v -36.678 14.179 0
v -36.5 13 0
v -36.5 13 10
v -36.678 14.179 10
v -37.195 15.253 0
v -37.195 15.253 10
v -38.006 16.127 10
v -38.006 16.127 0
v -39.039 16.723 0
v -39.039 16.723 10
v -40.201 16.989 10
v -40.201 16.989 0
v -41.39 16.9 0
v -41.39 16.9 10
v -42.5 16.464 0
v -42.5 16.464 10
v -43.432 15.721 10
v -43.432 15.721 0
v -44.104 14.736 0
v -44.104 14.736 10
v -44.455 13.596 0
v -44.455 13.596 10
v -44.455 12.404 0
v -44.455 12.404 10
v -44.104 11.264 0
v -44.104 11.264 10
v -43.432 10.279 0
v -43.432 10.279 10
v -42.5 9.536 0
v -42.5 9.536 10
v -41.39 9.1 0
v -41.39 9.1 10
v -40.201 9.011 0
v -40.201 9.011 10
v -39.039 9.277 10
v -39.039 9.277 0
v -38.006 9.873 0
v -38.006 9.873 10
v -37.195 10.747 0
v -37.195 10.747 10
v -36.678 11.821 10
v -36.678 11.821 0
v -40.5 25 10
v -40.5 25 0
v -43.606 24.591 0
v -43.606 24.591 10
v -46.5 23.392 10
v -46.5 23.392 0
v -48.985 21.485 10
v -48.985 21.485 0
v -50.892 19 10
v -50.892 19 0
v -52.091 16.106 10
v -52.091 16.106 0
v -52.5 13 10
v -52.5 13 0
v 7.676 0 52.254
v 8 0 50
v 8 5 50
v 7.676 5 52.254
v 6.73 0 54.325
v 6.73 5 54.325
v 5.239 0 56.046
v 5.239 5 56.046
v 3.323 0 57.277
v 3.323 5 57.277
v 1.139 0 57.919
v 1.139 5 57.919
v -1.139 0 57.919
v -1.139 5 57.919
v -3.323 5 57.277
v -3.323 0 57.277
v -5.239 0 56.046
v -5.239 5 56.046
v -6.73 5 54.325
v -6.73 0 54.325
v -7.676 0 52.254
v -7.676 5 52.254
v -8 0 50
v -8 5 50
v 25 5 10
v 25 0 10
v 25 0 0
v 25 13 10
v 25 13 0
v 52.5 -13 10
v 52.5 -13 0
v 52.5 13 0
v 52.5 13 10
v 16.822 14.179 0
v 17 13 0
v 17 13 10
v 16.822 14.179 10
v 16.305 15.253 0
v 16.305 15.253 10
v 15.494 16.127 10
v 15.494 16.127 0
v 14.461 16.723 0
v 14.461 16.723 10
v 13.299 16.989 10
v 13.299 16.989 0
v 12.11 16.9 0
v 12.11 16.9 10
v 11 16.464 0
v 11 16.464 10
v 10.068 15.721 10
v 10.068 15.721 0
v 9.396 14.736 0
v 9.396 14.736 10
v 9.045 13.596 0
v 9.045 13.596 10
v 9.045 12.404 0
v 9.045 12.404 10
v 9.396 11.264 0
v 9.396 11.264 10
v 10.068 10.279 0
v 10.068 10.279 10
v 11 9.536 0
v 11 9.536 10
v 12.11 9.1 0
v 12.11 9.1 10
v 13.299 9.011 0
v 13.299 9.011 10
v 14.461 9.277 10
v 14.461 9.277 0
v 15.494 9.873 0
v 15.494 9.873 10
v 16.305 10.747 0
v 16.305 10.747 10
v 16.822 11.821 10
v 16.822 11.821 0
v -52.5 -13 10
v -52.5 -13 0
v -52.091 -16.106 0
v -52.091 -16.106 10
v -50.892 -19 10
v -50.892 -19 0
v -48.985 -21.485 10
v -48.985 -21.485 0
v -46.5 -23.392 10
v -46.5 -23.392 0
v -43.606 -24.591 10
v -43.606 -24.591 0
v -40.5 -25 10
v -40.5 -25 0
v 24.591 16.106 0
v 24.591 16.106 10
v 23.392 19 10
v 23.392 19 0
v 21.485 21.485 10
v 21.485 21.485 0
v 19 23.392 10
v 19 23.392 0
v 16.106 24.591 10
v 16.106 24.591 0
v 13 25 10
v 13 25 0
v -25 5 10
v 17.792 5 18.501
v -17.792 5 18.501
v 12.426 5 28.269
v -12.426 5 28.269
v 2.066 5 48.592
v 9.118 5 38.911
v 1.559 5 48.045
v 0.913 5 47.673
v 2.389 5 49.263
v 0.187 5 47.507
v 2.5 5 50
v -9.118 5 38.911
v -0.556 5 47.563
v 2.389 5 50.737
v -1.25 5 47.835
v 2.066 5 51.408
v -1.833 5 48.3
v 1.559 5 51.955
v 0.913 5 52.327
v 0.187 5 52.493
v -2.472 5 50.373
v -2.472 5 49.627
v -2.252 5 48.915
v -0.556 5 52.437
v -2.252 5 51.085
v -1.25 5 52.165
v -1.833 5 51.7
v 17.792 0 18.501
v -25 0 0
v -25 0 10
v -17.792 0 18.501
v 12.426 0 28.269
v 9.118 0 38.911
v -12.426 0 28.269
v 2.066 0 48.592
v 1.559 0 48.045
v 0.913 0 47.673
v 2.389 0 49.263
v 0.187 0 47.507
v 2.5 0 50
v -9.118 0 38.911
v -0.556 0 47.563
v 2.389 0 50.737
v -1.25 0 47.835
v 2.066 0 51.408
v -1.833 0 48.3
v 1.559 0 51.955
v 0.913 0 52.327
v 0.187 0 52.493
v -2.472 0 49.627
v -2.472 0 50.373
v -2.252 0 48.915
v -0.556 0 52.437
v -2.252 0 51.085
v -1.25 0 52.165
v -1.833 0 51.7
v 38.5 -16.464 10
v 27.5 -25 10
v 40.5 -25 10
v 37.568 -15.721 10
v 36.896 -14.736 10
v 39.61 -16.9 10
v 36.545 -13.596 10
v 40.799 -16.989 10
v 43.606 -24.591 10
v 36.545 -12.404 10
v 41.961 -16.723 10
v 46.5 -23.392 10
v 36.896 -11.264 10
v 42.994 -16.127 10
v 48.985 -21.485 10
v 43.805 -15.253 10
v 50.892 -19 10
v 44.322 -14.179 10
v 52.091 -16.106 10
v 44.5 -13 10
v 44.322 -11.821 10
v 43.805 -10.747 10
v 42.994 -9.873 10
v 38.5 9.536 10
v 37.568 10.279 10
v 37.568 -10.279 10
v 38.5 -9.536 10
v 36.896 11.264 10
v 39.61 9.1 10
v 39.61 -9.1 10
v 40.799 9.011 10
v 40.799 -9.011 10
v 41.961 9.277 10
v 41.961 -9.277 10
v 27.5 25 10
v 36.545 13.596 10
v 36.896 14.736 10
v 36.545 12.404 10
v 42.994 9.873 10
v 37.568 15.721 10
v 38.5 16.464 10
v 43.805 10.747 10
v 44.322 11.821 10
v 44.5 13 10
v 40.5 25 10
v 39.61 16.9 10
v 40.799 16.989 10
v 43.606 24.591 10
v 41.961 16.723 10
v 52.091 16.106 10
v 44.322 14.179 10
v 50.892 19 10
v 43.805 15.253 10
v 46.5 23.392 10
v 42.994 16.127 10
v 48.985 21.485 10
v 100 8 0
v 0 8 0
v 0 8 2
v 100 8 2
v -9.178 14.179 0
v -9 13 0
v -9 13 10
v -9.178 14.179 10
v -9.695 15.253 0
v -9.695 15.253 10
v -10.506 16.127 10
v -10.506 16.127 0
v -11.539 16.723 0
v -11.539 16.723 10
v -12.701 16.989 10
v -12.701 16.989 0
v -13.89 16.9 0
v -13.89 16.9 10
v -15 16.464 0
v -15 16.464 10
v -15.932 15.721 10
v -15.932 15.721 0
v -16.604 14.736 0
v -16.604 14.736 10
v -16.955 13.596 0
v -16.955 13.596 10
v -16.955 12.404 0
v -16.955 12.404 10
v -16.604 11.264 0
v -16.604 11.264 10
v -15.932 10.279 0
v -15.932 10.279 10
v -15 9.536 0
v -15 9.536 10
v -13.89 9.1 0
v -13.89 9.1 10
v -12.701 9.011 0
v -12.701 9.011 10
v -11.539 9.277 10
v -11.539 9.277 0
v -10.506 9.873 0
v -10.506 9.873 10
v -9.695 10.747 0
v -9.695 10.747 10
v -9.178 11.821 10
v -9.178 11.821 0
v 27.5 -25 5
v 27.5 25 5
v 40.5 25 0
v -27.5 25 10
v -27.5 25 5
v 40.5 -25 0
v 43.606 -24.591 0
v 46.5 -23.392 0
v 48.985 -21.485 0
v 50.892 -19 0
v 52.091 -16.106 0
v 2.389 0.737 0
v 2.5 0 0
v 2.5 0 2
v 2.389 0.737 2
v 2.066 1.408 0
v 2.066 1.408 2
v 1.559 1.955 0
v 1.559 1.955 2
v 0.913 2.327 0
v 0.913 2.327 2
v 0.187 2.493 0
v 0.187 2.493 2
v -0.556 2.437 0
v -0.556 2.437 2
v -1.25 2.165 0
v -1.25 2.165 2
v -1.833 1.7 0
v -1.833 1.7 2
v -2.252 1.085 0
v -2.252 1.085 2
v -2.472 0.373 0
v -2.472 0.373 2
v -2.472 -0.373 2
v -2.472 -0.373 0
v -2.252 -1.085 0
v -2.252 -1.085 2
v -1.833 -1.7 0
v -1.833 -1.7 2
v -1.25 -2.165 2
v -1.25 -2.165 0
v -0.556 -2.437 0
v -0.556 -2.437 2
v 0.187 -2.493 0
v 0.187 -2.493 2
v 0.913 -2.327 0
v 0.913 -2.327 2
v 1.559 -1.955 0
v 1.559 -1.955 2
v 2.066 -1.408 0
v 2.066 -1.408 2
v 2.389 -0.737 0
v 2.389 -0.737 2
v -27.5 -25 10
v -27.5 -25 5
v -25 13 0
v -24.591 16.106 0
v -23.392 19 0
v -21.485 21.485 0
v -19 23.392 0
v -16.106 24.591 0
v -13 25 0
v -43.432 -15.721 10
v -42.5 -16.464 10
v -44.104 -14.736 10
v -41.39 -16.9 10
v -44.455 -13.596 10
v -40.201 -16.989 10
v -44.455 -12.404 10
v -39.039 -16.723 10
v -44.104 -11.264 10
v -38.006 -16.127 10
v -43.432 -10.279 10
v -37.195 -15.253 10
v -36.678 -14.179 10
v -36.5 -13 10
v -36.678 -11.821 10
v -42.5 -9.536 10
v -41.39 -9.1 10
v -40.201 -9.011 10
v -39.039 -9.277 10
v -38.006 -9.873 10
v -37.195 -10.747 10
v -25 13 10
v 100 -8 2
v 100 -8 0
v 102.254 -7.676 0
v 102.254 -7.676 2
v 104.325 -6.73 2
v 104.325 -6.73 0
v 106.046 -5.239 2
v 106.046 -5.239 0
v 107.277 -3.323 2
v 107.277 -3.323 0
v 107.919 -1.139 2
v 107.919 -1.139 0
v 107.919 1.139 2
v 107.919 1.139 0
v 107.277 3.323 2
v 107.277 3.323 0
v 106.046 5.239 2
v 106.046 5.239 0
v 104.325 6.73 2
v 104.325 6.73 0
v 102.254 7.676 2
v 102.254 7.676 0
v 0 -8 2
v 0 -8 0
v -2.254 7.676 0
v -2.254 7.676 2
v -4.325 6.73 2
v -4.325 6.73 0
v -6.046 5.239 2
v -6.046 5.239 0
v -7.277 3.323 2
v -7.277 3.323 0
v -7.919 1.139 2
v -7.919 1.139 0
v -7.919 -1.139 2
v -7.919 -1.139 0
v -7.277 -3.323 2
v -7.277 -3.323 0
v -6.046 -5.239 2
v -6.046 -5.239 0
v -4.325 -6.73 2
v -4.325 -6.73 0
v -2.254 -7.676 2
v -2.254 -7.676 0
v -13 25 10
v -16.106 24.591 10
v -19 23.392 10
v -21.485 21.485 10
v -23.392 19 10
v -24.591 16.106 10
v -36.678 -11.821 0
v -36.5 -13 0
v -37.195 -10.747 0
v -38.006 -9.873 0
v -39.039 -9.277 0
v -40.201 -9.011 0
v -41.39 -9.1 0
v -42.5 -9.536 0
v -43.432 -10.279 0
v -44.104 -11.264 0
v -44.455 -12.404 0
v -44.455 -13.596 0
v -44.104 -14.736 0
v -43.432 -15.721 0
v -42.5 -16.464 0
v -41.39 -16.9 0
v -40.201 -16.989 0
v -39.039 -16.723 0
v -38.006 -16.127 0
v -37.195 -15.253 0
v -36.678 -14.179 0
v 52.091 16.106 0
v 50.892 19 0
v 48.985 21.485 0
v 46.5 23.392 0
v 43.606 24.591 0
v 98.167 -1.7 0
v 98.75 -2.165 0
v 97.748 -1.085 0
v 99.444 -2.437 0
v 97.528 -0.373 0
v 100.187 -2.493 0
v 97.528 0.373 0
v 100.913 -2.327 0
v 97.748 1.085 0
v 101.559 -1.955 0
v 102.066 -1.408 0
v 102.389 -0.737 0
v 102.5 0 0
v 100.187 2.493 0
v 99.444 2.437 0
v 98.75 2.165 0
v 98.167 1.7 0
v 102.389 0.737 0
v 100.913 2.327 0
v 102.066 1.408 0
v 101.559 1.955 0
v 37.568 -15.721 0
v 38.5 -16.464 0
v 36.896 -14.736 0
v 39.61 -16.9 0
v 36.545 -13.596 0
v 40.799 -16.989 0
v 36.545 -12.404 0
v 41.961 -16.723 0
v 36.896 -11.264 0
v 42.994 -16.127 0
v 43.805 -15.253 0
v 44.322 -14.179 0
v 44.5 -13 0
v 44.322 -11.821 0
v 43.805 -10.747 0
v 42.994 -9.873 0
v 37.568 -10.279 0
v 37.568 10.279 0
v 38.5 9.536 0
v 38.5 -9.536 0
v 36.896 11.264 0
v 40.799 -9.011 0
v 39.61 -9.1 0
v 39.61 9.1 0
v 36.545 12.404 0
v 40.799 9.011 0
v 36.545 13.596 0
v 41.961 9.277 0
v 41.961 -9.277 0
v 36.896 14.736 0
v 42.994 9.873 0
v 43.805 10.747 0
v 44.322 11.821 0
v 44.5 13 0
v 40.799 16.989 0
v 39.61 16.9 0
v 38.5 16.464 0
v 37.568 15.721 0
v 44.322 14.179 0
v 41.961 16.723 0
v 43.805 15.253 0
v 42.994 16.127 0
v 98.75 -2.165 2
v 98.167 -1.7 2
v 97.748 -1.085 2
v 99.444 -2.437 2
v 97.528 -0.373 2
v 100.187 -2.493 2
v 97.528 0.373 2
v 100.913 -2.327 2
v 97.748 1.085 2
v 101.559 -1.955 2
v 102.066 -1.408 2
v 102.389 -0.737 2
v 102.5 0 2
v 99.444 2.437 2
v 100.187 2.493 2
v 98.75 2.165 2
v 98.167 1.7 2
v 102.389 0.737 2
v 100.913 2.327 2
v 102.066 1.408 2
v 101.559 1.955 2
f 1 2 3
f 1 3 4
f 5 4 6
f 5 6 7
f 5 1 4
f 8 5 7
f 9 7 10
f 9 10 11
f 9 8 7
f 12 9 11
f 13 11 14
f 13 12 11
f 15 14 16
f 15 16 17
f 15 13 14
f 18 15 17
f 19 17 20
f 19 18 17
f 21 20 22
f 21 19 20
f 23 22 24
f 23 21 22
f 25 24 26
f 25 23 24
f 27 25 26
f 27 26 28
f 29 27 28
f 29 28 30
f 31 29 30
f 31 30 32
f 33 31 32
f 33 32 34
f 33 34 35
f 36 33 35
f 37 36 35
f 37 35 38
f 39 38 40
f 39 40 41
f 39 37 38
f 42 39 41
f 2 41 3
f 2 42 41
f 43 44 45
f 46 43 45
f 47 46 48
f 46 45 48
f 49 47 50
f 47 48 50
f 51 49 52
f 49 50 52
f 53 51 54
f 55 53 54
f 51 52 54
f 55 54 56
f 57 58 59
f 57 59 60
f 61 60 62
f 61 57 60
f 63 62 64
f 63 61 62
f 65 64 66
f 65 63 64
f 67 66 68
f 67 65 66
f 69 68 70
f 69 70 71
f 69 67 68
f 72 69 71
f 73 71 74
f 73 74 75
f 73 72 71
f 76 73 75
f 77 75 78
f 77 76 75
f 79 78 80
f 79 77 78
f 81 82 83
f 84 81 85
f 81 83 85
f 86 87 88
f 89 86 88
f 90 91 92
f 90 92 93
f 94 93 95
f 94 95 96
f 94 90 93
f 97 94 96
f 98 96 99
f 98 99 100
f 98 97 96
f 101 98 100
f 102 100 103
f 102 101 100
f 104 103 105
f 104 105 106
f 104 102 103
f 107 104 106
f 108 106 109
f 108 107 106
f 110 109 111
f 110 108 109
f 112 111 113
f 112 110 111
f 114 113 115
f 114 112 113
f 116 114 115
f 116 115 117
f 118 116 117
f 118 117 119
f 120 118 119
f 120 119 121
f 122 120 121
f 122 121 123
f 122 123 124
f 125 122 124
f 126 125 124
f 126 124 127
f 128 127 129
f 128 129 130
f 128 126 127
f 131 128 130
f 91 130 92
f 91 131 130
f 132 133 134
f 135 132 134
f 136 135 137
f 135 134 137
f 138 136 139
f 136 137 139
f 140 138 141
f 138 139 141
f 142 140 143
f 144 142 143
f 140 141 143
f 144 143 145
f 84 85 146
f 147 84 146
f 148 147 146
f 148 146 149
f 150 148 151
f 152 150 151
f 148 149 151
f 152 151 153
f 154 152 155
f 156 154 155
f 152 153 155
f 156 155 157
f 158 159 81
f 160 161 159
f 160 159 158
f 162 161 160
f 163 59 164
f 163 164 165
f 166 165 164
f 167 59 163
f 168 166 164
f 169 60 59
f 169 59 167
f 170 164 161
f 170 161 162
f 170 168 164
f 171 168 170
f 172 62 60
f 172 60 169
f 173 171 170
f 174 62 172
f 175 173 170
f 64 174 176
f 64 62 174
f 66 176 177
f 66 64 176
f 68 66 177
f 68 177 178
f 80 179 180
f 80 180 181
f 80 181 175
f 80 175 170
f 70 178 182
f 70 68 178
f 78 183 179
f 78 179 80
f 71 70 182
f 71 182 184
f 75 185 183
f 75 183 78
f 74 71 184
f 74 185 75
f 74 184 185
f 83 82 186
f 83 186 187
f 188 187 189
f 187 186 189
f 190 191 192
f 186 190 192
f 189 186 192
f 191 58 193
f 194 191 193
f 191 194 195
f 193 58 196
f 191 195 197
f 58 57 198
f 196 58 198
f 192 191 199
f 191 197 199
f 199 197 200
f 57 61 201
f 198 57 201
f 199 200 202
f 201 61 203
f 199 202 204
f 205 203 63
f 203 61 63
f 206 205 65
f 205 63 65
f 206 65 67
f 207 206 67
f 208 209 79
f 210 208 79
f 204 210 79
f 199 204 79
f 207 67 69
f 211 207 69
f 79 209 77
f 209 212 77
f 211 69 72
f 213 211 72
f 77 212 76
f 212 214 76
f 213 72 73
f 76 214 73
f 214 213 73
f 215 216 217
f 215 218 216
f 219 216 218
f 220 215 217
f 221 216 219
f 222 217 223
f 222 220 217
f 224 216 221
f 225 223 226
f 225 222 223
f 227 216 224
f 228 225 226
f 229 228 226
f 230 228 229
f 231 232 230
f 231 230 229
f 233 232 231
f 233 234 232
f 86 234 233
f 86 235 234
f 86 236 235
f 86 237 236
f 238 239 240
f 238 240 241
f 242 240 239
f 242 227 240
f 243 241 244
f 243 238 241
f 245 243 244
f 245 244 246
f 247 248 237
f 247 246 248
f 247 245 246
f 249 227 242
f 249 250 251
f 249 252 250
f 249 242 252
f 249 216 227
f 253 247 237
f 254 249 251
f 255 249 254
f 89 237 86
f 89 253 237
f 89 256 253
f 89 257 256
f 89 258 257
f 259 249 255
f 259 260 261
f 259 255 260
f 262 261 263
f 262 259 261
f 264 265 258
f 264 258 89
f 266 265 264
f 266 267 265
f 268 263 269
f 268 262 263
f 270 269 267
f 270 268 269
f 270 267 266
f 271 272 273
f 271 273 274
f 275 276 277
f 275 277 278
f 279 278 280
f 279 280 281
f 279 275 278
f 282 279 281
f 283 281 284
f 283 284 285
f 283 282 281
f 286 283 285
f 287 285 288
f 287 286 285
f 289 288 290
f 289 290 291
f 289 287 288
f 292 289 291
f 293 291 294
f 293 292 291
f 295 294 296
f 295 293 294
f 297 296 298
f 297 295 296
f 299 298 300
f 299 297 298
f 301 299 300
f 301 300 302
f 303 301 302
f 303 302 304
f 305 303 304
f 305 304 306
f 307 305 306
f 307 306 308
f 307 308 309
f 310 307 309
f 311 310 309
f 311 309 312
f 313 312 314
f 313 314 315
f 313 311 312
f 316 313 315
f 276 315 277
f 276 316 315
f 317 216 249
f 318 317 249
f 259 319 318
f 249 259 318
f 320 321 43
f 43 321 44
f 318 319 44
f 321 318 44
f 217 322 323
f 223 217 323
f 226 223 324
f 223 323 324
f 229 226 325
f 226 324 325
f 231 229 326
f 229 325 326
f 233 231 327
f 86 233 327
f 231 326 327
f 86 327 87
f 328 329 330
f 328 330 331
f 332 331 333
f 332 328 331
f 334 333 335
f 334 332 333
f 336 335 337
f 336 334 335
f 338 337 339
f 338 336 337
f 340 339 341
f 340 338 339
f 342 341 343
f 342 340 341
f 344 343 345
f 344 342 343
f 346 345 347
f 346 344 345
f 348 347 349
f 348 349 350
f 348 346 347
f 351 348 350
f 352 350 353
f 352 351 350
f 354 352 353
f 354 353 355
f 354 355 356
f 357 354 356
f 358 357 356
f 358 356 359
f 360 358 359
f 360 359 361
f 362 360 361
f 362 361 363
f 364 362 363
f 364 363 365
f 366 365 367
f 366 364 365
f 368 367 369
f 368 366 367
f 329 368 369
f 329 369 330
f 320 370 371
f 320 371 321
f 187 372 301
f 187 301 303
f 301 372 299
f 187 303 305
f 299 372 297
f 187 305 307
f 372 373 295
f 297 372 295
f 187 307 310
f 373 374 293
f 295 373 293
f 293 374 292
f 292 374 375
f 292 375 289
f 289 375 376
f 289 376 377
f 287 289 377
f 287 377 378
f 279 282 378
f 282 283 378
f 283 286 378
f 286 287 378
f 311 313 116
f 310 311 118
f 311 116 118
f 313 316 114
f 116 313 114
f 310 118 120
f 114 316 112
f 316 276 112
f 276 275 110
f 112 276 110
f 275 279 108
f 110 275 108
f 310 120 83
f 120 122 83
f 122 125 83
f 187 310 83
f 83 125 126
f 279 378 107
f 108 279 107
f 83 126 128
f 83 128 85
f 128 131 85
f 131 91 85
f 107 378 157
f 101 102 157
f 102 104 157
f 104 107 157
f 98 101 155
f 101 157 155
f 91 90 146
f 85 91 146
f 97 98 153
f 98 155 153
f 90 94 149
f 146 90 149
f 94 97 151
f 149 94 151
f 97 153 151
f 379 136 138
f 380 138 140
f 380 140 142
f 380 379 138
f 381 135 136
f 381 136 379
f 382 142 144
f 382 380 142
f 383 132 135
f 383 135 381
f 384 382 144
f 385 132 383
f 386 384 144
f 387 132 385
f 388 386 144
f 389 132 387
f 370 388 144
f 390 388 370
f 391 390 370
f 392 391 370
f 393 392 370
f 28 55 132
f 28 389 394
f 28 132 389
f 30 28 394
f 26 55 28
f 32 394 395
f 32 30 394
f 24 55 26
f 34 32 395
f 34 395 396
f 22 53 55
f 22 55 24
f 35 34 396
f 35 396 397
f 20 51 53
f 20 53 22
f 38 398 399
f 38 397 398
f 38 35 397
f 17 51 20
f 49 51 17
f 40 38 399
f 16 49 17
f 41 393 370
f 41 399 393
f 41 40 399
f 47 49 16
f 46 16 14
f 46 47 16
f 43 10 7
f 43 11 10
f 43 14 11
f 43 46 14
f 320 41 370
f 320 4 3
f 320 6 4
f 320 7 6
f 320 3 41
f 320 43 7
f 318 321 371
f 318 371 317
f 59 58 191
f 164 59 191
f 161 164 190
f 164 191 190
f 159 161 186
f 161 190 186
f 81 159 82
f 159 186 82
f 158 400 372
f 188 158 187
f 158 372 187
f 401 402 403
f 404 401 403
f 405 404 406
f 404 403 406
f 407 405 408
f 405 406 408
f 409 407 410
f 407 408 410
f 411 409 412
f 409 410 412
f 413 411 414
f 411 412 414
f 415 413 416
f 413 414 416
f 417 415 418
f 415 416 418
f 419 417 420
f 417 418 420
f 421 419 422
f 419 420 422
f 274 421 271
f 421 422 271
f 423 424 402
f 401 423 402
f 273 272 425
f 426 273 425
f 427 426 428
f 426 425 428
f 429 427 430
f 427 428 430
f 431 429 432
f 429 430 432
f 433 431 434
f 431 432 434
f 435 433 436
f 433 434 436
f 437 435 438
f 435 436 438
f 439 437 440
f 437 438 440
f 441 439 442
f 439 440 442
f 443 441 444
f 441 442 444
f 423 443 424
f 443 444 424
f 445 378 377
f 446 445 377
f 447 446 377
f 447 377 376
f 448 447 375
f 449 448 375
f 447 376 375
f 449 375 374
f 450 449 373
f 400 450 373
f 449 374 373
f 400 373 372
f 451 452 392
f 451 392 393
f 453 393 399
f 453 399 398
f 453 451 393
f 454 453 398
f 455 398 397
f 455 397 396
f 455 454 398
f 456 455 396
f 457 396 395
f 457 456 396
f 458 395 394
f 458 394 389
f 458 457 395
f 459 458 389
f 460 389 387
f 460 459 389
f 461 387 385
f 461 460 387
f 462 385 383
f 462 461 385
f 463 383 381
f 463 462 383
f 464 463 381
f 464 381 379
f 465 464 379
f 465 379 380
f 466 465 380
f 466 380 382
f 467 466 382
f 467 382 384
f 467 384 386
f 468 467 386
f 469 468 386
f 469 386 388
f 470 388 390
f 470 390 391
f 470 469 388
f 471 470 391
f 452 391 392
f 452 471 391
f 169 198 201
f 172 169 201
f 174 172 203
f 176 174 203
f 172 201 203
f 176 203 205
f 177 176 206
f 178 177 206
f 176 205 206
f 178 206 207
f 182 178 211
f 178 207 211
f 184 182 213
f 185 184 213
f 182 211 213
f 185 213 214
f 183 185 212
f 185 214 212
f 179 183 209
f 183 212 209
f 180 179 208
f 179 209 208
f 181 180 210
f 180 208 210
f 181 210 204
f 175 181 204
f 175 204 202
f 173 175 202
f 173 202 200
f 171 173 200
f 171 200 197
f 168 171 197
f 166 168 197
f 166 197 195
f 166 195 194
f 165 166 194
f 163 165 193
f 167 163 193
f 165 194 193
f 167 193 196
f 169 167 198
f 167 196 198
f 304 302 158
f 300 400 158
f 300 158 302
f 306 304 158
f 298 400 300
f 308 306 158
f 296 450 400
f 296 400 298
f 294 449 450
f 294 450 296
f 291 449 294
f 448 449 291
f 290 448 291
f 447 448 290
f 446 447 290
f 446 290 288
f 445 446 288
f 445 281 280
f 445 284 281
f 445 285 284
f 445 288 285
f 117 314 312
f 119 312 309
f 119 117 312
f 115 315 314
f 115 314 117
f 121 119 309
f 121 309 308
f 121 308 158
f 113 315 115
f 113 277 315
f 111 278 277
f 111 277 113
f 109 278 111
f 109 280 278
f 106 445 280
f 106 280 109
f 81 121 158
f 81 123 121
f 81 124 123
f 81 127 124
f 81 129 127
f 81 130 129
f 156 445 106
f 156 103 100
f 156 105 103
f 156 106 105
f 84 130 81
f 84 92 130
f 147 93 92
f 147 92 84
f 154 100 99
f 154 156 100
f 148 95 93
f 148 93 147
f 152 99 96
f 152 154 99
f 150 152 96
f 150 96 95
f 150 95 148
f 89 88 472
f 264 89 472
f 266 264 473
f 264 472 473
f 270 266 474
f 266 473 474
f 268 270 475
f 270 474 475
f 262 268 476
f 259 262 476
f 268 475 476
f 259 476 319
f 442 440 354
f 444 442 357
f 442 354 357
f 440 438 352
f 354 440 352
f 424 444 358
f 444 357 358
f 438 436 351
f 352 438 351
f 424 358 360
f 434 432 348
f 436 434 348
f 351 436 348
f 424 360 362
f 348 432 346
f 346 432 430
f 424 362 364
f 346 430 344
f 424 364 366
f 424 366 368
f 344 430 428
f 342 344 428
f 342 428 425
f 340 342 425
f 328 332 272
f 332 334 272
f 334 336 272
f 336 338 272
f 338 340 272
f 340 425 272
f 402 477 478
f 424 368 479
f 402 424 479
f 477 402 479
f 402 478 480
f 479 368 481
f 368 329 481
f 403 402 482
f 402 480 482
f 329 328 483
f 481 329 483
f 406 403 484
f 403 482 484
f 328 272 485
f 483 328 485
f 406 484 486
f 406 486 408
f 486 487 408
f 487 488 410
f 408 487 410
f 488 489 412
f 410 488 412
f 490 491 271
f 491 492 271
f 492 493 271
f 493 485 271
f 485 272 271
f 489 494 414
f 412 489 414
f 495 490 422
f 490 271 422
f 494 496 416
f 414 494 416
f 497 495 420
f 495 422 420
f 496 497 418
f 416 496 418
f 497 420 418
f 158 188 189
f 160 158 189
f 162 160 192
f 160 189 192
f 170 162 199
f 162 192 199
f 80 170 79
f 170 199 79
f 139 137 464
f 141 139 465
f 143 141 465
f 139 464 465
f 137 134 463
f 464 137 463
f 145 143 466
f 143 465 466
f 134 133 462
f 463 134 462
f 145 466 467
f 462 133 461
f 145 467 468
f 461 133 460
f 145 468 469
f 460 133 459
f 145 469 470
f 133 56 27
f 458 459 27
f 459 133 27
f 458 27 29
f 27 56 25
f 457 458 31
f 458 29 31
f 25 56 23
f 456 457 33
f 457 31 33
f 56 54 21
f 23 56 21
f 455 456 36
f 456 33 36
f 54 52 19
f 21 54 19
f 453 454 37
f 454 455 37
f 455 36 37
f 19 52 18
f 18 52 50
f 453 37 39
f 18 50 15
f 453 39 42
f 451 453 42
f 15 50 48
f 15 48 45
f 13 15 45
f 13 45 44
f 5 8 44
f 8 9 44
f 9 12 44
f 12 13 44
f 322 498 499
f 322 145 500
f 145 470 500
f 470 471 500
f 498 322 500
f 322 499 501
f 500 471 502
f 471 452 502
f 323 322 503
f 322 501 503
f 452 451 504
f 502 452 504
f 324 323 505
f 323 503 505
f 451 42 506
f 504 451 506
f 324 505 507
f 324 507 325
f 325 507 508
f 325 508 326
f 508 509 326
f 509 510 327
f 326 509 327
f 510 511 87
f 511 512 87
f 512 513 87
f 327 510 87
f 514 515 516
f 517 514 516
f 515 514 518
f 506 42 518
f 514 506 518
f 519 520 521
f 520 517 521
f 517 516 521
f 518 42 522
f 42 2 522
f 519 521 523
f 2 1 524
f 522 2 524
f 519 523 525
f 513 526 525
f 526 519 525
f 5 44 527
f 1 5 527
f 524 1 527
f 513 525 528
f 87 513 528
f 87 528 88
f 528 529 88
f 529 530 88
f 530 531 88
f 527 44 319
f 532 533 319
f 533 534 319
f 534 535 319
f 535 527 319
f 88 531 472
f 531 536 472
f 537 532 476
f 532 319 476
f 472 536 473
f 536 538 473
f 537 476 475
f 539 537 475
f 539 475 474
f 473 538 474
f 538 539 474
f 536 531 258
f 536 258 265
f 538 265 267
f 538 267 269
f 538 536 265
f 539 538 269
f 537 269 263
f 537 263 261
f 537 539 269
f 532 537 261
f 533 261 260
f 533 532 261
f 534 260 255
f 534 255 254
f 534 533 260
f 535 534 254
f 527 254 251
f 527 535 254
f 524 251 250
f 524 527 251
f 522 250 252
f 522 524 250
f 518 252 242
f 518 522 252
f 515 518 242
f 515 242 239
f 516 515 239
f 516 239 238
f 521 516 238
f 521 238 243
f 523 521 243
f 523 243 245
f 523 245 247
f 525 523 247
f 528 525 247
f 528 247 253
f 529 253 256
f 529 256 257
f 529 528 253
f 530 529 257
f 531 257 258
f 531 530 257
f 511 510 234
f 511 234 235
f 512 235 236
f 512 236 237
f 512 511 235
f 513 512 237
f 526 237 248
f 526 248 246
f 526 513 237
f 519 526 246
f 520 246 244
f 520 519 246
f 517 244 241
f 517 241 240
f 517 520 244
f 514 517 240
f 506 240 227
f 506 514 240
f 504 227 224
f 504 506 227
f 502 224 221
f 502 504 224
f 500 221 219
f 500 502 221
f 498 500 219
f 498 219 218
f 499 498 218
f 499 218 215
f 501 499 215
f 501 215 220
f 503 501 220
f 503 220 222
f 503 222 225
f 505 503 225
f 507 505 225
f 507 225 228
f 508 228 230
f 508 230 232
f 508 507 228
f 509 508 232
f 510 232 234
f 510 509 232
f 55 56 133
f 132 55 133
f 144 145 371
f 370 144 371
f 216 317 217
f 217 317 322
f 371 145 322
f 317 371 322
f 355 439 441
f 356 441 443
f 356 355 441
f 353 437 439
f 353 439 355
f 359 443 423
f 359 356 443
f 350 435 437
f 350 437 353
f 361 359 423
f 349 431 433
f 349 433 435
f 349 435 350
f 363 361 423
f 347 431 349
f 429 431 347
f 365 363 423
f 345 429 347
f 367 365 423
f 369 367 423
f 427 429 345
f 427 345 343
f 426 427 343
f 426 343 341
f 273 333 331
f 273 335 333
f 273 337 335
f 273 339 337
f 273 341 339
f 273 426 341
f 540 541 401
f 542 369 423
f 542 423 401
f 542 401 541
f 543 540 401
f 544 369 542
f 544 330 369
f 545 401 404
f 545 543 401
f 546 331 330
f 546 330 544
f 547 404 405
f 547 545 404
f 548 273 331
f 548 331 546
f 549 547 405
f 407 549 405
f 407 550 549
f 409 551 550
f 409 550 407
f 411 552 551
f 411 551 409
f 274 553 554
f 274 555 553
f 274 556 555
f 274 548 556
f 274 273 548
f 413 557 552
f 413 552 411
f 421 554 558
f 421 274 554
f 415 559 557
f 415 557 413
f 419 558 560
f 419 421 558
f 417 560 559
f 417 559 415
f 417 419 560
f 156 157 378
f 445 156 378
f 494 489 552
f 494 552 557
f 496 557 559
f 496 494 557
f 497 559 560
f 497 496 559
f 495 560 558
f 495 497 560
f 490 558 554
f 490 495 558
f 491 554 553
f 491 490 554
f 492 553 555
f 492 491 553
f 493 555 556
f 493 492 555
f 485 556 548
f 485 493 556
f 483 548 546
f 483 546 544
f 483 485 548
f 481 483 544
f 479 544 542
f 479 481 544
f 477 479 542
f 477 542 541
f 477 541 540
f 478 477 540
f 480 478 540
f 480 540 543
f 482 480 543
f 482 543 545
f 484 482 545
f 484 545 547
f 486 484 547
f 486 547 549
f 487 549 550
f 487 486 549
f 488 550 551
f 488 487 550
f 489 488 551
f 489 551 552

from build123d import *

# Parameters (mm, degrees)
SKETCH_R     = 4
PAD_DEPTH    = 10
SKETCH001_W  = 55
SKETCH001_H  = 50
POCKET_DEPTH = 5
SKETCH002_R  = 4
PAD001_DEPTH = 10
SKETCH003_R  = 2.5
PAD002_DEPTH = 5
SKETCH004_R  = 2.5
PAD003_DEPTH = 2


with BuildPart() as base:
    # Sketch → Pad (new body)
    with BuildSketch(Plane.XY):
        with BuildLine():
            Line((-52.5, 13), (-52.5, -13))
            ThreePointArc((-52.5, -13), (-48.985281, -21.485281), (-40.5, -25))
            Line((-40.5, -25), (40.5, -25))
            ThreePointArc((40.5, -25), (48.985281, -21.485281), (52.5, -13))
            Line((52.5, -13), (52.5, 13))
            ThreePointArc((52.5, 13), (48.985281, 21.485281), (40.5, 25))
            Line((40.5, 25), (-40.5, 25))
            ThreePointArc((-40.5, 25), (-48.985281, 21.485281), (-52.5, 13))
        make_face()
        with Locations((-40.5, 13)):
            Circle(SKETCH_R, mode=Mode.SUBTRACT)
        with Locations((-40.5, -13)):
            Circle(SKETCH_R, mode=Mode.SUBTRACT)
        with Locations((40.5, 13)):
            Circle(SKETCH_R, mode=Mode.SUBTRACT)
        with Locations((40.5, -13)):
            Circle(SKETCH_R, mode=Mode.SUBTRACT)
    extrude(amount=PAD_DEPTH)

    # Sketch001 (on Face14 of Pad) → Pocket (cut)
    with BuildSketch(Plane.XY.offset(10)):
        Rectangle(SKETCH001_W, SKETCH001_H)
    extrude(amount=-POCKET_DEPTH, mode=Mode.SUBTRACT)


with BuildPart() as bracket:
    # Sketch002 → Pad001 (new body)
    with BuildSketch(Plane.XY):
        with BuildLine():
            Line((-25, 13), (-25, 0))
            Line((-25, 0), (25, 0))
            Line((25, 0), (25, 13))
            ThreePointArc((25, 13), (21.485281, 21.485281), (13, 25))
            Line((13, 25), (-13, 25))
            ThreePointArc((-13, 25), (-21.485281, 21.485281), (-25, 13))
        make_face()
        with Locations((-13, 13)):
            Circle(SKETCH002_R, mode=Mode.SUBTRACT)
        with Locations((13, 13)):
            Circle(SKETCH002_R, mode=Mode.SUBTRACT)
    extrude(amount=PAD001_DEPTH)

    # Sketch003 (on Face2 of Pad001) → Pad002 (join)
    with BuildSketch(Plane.XZ):
        with BuildLine():
            ThreePointArc((-25, 10), (-12.42632, 28.268686), (-8, 50))
            ThreePointArc((8, 50), (0, 58), (-8, 50))
            ThreePointArc((8, 50), (12.42632, 28.268686), (25, 10))
            Line((-25, 10), (25, 10))
        make_face()
        with Locations((0, 50)):
            Circle(SKETCH003_R, mode=Mode.SUBTRACT)
    extrude(amount=-PAD002_DEPTH)


with BuildPart() as link:
    # Sketch004 → Pad003 (new body)
    with BuildSketch(Plane.XY):
        with BuildLine():
            ThreePointArc((0, 8), (-8, 0), (0, -8))
            Line((0, -8), (100, -8))
            ThreePointArc((100, -8), (108, 0), (100, 8))
            Line((0, 8), (100, 8))
        make_face()
        Circle(SKETCH004_R, mode=Mode.SUBTRACT)
        with Locations((100, 0)):
            Circle(SKETCH004_R, mode=Mode.SUBTRACT)
    extrude(amount=PAD003_DEPTH)


solid = Compound([base.part, bracket.part, link.part])
